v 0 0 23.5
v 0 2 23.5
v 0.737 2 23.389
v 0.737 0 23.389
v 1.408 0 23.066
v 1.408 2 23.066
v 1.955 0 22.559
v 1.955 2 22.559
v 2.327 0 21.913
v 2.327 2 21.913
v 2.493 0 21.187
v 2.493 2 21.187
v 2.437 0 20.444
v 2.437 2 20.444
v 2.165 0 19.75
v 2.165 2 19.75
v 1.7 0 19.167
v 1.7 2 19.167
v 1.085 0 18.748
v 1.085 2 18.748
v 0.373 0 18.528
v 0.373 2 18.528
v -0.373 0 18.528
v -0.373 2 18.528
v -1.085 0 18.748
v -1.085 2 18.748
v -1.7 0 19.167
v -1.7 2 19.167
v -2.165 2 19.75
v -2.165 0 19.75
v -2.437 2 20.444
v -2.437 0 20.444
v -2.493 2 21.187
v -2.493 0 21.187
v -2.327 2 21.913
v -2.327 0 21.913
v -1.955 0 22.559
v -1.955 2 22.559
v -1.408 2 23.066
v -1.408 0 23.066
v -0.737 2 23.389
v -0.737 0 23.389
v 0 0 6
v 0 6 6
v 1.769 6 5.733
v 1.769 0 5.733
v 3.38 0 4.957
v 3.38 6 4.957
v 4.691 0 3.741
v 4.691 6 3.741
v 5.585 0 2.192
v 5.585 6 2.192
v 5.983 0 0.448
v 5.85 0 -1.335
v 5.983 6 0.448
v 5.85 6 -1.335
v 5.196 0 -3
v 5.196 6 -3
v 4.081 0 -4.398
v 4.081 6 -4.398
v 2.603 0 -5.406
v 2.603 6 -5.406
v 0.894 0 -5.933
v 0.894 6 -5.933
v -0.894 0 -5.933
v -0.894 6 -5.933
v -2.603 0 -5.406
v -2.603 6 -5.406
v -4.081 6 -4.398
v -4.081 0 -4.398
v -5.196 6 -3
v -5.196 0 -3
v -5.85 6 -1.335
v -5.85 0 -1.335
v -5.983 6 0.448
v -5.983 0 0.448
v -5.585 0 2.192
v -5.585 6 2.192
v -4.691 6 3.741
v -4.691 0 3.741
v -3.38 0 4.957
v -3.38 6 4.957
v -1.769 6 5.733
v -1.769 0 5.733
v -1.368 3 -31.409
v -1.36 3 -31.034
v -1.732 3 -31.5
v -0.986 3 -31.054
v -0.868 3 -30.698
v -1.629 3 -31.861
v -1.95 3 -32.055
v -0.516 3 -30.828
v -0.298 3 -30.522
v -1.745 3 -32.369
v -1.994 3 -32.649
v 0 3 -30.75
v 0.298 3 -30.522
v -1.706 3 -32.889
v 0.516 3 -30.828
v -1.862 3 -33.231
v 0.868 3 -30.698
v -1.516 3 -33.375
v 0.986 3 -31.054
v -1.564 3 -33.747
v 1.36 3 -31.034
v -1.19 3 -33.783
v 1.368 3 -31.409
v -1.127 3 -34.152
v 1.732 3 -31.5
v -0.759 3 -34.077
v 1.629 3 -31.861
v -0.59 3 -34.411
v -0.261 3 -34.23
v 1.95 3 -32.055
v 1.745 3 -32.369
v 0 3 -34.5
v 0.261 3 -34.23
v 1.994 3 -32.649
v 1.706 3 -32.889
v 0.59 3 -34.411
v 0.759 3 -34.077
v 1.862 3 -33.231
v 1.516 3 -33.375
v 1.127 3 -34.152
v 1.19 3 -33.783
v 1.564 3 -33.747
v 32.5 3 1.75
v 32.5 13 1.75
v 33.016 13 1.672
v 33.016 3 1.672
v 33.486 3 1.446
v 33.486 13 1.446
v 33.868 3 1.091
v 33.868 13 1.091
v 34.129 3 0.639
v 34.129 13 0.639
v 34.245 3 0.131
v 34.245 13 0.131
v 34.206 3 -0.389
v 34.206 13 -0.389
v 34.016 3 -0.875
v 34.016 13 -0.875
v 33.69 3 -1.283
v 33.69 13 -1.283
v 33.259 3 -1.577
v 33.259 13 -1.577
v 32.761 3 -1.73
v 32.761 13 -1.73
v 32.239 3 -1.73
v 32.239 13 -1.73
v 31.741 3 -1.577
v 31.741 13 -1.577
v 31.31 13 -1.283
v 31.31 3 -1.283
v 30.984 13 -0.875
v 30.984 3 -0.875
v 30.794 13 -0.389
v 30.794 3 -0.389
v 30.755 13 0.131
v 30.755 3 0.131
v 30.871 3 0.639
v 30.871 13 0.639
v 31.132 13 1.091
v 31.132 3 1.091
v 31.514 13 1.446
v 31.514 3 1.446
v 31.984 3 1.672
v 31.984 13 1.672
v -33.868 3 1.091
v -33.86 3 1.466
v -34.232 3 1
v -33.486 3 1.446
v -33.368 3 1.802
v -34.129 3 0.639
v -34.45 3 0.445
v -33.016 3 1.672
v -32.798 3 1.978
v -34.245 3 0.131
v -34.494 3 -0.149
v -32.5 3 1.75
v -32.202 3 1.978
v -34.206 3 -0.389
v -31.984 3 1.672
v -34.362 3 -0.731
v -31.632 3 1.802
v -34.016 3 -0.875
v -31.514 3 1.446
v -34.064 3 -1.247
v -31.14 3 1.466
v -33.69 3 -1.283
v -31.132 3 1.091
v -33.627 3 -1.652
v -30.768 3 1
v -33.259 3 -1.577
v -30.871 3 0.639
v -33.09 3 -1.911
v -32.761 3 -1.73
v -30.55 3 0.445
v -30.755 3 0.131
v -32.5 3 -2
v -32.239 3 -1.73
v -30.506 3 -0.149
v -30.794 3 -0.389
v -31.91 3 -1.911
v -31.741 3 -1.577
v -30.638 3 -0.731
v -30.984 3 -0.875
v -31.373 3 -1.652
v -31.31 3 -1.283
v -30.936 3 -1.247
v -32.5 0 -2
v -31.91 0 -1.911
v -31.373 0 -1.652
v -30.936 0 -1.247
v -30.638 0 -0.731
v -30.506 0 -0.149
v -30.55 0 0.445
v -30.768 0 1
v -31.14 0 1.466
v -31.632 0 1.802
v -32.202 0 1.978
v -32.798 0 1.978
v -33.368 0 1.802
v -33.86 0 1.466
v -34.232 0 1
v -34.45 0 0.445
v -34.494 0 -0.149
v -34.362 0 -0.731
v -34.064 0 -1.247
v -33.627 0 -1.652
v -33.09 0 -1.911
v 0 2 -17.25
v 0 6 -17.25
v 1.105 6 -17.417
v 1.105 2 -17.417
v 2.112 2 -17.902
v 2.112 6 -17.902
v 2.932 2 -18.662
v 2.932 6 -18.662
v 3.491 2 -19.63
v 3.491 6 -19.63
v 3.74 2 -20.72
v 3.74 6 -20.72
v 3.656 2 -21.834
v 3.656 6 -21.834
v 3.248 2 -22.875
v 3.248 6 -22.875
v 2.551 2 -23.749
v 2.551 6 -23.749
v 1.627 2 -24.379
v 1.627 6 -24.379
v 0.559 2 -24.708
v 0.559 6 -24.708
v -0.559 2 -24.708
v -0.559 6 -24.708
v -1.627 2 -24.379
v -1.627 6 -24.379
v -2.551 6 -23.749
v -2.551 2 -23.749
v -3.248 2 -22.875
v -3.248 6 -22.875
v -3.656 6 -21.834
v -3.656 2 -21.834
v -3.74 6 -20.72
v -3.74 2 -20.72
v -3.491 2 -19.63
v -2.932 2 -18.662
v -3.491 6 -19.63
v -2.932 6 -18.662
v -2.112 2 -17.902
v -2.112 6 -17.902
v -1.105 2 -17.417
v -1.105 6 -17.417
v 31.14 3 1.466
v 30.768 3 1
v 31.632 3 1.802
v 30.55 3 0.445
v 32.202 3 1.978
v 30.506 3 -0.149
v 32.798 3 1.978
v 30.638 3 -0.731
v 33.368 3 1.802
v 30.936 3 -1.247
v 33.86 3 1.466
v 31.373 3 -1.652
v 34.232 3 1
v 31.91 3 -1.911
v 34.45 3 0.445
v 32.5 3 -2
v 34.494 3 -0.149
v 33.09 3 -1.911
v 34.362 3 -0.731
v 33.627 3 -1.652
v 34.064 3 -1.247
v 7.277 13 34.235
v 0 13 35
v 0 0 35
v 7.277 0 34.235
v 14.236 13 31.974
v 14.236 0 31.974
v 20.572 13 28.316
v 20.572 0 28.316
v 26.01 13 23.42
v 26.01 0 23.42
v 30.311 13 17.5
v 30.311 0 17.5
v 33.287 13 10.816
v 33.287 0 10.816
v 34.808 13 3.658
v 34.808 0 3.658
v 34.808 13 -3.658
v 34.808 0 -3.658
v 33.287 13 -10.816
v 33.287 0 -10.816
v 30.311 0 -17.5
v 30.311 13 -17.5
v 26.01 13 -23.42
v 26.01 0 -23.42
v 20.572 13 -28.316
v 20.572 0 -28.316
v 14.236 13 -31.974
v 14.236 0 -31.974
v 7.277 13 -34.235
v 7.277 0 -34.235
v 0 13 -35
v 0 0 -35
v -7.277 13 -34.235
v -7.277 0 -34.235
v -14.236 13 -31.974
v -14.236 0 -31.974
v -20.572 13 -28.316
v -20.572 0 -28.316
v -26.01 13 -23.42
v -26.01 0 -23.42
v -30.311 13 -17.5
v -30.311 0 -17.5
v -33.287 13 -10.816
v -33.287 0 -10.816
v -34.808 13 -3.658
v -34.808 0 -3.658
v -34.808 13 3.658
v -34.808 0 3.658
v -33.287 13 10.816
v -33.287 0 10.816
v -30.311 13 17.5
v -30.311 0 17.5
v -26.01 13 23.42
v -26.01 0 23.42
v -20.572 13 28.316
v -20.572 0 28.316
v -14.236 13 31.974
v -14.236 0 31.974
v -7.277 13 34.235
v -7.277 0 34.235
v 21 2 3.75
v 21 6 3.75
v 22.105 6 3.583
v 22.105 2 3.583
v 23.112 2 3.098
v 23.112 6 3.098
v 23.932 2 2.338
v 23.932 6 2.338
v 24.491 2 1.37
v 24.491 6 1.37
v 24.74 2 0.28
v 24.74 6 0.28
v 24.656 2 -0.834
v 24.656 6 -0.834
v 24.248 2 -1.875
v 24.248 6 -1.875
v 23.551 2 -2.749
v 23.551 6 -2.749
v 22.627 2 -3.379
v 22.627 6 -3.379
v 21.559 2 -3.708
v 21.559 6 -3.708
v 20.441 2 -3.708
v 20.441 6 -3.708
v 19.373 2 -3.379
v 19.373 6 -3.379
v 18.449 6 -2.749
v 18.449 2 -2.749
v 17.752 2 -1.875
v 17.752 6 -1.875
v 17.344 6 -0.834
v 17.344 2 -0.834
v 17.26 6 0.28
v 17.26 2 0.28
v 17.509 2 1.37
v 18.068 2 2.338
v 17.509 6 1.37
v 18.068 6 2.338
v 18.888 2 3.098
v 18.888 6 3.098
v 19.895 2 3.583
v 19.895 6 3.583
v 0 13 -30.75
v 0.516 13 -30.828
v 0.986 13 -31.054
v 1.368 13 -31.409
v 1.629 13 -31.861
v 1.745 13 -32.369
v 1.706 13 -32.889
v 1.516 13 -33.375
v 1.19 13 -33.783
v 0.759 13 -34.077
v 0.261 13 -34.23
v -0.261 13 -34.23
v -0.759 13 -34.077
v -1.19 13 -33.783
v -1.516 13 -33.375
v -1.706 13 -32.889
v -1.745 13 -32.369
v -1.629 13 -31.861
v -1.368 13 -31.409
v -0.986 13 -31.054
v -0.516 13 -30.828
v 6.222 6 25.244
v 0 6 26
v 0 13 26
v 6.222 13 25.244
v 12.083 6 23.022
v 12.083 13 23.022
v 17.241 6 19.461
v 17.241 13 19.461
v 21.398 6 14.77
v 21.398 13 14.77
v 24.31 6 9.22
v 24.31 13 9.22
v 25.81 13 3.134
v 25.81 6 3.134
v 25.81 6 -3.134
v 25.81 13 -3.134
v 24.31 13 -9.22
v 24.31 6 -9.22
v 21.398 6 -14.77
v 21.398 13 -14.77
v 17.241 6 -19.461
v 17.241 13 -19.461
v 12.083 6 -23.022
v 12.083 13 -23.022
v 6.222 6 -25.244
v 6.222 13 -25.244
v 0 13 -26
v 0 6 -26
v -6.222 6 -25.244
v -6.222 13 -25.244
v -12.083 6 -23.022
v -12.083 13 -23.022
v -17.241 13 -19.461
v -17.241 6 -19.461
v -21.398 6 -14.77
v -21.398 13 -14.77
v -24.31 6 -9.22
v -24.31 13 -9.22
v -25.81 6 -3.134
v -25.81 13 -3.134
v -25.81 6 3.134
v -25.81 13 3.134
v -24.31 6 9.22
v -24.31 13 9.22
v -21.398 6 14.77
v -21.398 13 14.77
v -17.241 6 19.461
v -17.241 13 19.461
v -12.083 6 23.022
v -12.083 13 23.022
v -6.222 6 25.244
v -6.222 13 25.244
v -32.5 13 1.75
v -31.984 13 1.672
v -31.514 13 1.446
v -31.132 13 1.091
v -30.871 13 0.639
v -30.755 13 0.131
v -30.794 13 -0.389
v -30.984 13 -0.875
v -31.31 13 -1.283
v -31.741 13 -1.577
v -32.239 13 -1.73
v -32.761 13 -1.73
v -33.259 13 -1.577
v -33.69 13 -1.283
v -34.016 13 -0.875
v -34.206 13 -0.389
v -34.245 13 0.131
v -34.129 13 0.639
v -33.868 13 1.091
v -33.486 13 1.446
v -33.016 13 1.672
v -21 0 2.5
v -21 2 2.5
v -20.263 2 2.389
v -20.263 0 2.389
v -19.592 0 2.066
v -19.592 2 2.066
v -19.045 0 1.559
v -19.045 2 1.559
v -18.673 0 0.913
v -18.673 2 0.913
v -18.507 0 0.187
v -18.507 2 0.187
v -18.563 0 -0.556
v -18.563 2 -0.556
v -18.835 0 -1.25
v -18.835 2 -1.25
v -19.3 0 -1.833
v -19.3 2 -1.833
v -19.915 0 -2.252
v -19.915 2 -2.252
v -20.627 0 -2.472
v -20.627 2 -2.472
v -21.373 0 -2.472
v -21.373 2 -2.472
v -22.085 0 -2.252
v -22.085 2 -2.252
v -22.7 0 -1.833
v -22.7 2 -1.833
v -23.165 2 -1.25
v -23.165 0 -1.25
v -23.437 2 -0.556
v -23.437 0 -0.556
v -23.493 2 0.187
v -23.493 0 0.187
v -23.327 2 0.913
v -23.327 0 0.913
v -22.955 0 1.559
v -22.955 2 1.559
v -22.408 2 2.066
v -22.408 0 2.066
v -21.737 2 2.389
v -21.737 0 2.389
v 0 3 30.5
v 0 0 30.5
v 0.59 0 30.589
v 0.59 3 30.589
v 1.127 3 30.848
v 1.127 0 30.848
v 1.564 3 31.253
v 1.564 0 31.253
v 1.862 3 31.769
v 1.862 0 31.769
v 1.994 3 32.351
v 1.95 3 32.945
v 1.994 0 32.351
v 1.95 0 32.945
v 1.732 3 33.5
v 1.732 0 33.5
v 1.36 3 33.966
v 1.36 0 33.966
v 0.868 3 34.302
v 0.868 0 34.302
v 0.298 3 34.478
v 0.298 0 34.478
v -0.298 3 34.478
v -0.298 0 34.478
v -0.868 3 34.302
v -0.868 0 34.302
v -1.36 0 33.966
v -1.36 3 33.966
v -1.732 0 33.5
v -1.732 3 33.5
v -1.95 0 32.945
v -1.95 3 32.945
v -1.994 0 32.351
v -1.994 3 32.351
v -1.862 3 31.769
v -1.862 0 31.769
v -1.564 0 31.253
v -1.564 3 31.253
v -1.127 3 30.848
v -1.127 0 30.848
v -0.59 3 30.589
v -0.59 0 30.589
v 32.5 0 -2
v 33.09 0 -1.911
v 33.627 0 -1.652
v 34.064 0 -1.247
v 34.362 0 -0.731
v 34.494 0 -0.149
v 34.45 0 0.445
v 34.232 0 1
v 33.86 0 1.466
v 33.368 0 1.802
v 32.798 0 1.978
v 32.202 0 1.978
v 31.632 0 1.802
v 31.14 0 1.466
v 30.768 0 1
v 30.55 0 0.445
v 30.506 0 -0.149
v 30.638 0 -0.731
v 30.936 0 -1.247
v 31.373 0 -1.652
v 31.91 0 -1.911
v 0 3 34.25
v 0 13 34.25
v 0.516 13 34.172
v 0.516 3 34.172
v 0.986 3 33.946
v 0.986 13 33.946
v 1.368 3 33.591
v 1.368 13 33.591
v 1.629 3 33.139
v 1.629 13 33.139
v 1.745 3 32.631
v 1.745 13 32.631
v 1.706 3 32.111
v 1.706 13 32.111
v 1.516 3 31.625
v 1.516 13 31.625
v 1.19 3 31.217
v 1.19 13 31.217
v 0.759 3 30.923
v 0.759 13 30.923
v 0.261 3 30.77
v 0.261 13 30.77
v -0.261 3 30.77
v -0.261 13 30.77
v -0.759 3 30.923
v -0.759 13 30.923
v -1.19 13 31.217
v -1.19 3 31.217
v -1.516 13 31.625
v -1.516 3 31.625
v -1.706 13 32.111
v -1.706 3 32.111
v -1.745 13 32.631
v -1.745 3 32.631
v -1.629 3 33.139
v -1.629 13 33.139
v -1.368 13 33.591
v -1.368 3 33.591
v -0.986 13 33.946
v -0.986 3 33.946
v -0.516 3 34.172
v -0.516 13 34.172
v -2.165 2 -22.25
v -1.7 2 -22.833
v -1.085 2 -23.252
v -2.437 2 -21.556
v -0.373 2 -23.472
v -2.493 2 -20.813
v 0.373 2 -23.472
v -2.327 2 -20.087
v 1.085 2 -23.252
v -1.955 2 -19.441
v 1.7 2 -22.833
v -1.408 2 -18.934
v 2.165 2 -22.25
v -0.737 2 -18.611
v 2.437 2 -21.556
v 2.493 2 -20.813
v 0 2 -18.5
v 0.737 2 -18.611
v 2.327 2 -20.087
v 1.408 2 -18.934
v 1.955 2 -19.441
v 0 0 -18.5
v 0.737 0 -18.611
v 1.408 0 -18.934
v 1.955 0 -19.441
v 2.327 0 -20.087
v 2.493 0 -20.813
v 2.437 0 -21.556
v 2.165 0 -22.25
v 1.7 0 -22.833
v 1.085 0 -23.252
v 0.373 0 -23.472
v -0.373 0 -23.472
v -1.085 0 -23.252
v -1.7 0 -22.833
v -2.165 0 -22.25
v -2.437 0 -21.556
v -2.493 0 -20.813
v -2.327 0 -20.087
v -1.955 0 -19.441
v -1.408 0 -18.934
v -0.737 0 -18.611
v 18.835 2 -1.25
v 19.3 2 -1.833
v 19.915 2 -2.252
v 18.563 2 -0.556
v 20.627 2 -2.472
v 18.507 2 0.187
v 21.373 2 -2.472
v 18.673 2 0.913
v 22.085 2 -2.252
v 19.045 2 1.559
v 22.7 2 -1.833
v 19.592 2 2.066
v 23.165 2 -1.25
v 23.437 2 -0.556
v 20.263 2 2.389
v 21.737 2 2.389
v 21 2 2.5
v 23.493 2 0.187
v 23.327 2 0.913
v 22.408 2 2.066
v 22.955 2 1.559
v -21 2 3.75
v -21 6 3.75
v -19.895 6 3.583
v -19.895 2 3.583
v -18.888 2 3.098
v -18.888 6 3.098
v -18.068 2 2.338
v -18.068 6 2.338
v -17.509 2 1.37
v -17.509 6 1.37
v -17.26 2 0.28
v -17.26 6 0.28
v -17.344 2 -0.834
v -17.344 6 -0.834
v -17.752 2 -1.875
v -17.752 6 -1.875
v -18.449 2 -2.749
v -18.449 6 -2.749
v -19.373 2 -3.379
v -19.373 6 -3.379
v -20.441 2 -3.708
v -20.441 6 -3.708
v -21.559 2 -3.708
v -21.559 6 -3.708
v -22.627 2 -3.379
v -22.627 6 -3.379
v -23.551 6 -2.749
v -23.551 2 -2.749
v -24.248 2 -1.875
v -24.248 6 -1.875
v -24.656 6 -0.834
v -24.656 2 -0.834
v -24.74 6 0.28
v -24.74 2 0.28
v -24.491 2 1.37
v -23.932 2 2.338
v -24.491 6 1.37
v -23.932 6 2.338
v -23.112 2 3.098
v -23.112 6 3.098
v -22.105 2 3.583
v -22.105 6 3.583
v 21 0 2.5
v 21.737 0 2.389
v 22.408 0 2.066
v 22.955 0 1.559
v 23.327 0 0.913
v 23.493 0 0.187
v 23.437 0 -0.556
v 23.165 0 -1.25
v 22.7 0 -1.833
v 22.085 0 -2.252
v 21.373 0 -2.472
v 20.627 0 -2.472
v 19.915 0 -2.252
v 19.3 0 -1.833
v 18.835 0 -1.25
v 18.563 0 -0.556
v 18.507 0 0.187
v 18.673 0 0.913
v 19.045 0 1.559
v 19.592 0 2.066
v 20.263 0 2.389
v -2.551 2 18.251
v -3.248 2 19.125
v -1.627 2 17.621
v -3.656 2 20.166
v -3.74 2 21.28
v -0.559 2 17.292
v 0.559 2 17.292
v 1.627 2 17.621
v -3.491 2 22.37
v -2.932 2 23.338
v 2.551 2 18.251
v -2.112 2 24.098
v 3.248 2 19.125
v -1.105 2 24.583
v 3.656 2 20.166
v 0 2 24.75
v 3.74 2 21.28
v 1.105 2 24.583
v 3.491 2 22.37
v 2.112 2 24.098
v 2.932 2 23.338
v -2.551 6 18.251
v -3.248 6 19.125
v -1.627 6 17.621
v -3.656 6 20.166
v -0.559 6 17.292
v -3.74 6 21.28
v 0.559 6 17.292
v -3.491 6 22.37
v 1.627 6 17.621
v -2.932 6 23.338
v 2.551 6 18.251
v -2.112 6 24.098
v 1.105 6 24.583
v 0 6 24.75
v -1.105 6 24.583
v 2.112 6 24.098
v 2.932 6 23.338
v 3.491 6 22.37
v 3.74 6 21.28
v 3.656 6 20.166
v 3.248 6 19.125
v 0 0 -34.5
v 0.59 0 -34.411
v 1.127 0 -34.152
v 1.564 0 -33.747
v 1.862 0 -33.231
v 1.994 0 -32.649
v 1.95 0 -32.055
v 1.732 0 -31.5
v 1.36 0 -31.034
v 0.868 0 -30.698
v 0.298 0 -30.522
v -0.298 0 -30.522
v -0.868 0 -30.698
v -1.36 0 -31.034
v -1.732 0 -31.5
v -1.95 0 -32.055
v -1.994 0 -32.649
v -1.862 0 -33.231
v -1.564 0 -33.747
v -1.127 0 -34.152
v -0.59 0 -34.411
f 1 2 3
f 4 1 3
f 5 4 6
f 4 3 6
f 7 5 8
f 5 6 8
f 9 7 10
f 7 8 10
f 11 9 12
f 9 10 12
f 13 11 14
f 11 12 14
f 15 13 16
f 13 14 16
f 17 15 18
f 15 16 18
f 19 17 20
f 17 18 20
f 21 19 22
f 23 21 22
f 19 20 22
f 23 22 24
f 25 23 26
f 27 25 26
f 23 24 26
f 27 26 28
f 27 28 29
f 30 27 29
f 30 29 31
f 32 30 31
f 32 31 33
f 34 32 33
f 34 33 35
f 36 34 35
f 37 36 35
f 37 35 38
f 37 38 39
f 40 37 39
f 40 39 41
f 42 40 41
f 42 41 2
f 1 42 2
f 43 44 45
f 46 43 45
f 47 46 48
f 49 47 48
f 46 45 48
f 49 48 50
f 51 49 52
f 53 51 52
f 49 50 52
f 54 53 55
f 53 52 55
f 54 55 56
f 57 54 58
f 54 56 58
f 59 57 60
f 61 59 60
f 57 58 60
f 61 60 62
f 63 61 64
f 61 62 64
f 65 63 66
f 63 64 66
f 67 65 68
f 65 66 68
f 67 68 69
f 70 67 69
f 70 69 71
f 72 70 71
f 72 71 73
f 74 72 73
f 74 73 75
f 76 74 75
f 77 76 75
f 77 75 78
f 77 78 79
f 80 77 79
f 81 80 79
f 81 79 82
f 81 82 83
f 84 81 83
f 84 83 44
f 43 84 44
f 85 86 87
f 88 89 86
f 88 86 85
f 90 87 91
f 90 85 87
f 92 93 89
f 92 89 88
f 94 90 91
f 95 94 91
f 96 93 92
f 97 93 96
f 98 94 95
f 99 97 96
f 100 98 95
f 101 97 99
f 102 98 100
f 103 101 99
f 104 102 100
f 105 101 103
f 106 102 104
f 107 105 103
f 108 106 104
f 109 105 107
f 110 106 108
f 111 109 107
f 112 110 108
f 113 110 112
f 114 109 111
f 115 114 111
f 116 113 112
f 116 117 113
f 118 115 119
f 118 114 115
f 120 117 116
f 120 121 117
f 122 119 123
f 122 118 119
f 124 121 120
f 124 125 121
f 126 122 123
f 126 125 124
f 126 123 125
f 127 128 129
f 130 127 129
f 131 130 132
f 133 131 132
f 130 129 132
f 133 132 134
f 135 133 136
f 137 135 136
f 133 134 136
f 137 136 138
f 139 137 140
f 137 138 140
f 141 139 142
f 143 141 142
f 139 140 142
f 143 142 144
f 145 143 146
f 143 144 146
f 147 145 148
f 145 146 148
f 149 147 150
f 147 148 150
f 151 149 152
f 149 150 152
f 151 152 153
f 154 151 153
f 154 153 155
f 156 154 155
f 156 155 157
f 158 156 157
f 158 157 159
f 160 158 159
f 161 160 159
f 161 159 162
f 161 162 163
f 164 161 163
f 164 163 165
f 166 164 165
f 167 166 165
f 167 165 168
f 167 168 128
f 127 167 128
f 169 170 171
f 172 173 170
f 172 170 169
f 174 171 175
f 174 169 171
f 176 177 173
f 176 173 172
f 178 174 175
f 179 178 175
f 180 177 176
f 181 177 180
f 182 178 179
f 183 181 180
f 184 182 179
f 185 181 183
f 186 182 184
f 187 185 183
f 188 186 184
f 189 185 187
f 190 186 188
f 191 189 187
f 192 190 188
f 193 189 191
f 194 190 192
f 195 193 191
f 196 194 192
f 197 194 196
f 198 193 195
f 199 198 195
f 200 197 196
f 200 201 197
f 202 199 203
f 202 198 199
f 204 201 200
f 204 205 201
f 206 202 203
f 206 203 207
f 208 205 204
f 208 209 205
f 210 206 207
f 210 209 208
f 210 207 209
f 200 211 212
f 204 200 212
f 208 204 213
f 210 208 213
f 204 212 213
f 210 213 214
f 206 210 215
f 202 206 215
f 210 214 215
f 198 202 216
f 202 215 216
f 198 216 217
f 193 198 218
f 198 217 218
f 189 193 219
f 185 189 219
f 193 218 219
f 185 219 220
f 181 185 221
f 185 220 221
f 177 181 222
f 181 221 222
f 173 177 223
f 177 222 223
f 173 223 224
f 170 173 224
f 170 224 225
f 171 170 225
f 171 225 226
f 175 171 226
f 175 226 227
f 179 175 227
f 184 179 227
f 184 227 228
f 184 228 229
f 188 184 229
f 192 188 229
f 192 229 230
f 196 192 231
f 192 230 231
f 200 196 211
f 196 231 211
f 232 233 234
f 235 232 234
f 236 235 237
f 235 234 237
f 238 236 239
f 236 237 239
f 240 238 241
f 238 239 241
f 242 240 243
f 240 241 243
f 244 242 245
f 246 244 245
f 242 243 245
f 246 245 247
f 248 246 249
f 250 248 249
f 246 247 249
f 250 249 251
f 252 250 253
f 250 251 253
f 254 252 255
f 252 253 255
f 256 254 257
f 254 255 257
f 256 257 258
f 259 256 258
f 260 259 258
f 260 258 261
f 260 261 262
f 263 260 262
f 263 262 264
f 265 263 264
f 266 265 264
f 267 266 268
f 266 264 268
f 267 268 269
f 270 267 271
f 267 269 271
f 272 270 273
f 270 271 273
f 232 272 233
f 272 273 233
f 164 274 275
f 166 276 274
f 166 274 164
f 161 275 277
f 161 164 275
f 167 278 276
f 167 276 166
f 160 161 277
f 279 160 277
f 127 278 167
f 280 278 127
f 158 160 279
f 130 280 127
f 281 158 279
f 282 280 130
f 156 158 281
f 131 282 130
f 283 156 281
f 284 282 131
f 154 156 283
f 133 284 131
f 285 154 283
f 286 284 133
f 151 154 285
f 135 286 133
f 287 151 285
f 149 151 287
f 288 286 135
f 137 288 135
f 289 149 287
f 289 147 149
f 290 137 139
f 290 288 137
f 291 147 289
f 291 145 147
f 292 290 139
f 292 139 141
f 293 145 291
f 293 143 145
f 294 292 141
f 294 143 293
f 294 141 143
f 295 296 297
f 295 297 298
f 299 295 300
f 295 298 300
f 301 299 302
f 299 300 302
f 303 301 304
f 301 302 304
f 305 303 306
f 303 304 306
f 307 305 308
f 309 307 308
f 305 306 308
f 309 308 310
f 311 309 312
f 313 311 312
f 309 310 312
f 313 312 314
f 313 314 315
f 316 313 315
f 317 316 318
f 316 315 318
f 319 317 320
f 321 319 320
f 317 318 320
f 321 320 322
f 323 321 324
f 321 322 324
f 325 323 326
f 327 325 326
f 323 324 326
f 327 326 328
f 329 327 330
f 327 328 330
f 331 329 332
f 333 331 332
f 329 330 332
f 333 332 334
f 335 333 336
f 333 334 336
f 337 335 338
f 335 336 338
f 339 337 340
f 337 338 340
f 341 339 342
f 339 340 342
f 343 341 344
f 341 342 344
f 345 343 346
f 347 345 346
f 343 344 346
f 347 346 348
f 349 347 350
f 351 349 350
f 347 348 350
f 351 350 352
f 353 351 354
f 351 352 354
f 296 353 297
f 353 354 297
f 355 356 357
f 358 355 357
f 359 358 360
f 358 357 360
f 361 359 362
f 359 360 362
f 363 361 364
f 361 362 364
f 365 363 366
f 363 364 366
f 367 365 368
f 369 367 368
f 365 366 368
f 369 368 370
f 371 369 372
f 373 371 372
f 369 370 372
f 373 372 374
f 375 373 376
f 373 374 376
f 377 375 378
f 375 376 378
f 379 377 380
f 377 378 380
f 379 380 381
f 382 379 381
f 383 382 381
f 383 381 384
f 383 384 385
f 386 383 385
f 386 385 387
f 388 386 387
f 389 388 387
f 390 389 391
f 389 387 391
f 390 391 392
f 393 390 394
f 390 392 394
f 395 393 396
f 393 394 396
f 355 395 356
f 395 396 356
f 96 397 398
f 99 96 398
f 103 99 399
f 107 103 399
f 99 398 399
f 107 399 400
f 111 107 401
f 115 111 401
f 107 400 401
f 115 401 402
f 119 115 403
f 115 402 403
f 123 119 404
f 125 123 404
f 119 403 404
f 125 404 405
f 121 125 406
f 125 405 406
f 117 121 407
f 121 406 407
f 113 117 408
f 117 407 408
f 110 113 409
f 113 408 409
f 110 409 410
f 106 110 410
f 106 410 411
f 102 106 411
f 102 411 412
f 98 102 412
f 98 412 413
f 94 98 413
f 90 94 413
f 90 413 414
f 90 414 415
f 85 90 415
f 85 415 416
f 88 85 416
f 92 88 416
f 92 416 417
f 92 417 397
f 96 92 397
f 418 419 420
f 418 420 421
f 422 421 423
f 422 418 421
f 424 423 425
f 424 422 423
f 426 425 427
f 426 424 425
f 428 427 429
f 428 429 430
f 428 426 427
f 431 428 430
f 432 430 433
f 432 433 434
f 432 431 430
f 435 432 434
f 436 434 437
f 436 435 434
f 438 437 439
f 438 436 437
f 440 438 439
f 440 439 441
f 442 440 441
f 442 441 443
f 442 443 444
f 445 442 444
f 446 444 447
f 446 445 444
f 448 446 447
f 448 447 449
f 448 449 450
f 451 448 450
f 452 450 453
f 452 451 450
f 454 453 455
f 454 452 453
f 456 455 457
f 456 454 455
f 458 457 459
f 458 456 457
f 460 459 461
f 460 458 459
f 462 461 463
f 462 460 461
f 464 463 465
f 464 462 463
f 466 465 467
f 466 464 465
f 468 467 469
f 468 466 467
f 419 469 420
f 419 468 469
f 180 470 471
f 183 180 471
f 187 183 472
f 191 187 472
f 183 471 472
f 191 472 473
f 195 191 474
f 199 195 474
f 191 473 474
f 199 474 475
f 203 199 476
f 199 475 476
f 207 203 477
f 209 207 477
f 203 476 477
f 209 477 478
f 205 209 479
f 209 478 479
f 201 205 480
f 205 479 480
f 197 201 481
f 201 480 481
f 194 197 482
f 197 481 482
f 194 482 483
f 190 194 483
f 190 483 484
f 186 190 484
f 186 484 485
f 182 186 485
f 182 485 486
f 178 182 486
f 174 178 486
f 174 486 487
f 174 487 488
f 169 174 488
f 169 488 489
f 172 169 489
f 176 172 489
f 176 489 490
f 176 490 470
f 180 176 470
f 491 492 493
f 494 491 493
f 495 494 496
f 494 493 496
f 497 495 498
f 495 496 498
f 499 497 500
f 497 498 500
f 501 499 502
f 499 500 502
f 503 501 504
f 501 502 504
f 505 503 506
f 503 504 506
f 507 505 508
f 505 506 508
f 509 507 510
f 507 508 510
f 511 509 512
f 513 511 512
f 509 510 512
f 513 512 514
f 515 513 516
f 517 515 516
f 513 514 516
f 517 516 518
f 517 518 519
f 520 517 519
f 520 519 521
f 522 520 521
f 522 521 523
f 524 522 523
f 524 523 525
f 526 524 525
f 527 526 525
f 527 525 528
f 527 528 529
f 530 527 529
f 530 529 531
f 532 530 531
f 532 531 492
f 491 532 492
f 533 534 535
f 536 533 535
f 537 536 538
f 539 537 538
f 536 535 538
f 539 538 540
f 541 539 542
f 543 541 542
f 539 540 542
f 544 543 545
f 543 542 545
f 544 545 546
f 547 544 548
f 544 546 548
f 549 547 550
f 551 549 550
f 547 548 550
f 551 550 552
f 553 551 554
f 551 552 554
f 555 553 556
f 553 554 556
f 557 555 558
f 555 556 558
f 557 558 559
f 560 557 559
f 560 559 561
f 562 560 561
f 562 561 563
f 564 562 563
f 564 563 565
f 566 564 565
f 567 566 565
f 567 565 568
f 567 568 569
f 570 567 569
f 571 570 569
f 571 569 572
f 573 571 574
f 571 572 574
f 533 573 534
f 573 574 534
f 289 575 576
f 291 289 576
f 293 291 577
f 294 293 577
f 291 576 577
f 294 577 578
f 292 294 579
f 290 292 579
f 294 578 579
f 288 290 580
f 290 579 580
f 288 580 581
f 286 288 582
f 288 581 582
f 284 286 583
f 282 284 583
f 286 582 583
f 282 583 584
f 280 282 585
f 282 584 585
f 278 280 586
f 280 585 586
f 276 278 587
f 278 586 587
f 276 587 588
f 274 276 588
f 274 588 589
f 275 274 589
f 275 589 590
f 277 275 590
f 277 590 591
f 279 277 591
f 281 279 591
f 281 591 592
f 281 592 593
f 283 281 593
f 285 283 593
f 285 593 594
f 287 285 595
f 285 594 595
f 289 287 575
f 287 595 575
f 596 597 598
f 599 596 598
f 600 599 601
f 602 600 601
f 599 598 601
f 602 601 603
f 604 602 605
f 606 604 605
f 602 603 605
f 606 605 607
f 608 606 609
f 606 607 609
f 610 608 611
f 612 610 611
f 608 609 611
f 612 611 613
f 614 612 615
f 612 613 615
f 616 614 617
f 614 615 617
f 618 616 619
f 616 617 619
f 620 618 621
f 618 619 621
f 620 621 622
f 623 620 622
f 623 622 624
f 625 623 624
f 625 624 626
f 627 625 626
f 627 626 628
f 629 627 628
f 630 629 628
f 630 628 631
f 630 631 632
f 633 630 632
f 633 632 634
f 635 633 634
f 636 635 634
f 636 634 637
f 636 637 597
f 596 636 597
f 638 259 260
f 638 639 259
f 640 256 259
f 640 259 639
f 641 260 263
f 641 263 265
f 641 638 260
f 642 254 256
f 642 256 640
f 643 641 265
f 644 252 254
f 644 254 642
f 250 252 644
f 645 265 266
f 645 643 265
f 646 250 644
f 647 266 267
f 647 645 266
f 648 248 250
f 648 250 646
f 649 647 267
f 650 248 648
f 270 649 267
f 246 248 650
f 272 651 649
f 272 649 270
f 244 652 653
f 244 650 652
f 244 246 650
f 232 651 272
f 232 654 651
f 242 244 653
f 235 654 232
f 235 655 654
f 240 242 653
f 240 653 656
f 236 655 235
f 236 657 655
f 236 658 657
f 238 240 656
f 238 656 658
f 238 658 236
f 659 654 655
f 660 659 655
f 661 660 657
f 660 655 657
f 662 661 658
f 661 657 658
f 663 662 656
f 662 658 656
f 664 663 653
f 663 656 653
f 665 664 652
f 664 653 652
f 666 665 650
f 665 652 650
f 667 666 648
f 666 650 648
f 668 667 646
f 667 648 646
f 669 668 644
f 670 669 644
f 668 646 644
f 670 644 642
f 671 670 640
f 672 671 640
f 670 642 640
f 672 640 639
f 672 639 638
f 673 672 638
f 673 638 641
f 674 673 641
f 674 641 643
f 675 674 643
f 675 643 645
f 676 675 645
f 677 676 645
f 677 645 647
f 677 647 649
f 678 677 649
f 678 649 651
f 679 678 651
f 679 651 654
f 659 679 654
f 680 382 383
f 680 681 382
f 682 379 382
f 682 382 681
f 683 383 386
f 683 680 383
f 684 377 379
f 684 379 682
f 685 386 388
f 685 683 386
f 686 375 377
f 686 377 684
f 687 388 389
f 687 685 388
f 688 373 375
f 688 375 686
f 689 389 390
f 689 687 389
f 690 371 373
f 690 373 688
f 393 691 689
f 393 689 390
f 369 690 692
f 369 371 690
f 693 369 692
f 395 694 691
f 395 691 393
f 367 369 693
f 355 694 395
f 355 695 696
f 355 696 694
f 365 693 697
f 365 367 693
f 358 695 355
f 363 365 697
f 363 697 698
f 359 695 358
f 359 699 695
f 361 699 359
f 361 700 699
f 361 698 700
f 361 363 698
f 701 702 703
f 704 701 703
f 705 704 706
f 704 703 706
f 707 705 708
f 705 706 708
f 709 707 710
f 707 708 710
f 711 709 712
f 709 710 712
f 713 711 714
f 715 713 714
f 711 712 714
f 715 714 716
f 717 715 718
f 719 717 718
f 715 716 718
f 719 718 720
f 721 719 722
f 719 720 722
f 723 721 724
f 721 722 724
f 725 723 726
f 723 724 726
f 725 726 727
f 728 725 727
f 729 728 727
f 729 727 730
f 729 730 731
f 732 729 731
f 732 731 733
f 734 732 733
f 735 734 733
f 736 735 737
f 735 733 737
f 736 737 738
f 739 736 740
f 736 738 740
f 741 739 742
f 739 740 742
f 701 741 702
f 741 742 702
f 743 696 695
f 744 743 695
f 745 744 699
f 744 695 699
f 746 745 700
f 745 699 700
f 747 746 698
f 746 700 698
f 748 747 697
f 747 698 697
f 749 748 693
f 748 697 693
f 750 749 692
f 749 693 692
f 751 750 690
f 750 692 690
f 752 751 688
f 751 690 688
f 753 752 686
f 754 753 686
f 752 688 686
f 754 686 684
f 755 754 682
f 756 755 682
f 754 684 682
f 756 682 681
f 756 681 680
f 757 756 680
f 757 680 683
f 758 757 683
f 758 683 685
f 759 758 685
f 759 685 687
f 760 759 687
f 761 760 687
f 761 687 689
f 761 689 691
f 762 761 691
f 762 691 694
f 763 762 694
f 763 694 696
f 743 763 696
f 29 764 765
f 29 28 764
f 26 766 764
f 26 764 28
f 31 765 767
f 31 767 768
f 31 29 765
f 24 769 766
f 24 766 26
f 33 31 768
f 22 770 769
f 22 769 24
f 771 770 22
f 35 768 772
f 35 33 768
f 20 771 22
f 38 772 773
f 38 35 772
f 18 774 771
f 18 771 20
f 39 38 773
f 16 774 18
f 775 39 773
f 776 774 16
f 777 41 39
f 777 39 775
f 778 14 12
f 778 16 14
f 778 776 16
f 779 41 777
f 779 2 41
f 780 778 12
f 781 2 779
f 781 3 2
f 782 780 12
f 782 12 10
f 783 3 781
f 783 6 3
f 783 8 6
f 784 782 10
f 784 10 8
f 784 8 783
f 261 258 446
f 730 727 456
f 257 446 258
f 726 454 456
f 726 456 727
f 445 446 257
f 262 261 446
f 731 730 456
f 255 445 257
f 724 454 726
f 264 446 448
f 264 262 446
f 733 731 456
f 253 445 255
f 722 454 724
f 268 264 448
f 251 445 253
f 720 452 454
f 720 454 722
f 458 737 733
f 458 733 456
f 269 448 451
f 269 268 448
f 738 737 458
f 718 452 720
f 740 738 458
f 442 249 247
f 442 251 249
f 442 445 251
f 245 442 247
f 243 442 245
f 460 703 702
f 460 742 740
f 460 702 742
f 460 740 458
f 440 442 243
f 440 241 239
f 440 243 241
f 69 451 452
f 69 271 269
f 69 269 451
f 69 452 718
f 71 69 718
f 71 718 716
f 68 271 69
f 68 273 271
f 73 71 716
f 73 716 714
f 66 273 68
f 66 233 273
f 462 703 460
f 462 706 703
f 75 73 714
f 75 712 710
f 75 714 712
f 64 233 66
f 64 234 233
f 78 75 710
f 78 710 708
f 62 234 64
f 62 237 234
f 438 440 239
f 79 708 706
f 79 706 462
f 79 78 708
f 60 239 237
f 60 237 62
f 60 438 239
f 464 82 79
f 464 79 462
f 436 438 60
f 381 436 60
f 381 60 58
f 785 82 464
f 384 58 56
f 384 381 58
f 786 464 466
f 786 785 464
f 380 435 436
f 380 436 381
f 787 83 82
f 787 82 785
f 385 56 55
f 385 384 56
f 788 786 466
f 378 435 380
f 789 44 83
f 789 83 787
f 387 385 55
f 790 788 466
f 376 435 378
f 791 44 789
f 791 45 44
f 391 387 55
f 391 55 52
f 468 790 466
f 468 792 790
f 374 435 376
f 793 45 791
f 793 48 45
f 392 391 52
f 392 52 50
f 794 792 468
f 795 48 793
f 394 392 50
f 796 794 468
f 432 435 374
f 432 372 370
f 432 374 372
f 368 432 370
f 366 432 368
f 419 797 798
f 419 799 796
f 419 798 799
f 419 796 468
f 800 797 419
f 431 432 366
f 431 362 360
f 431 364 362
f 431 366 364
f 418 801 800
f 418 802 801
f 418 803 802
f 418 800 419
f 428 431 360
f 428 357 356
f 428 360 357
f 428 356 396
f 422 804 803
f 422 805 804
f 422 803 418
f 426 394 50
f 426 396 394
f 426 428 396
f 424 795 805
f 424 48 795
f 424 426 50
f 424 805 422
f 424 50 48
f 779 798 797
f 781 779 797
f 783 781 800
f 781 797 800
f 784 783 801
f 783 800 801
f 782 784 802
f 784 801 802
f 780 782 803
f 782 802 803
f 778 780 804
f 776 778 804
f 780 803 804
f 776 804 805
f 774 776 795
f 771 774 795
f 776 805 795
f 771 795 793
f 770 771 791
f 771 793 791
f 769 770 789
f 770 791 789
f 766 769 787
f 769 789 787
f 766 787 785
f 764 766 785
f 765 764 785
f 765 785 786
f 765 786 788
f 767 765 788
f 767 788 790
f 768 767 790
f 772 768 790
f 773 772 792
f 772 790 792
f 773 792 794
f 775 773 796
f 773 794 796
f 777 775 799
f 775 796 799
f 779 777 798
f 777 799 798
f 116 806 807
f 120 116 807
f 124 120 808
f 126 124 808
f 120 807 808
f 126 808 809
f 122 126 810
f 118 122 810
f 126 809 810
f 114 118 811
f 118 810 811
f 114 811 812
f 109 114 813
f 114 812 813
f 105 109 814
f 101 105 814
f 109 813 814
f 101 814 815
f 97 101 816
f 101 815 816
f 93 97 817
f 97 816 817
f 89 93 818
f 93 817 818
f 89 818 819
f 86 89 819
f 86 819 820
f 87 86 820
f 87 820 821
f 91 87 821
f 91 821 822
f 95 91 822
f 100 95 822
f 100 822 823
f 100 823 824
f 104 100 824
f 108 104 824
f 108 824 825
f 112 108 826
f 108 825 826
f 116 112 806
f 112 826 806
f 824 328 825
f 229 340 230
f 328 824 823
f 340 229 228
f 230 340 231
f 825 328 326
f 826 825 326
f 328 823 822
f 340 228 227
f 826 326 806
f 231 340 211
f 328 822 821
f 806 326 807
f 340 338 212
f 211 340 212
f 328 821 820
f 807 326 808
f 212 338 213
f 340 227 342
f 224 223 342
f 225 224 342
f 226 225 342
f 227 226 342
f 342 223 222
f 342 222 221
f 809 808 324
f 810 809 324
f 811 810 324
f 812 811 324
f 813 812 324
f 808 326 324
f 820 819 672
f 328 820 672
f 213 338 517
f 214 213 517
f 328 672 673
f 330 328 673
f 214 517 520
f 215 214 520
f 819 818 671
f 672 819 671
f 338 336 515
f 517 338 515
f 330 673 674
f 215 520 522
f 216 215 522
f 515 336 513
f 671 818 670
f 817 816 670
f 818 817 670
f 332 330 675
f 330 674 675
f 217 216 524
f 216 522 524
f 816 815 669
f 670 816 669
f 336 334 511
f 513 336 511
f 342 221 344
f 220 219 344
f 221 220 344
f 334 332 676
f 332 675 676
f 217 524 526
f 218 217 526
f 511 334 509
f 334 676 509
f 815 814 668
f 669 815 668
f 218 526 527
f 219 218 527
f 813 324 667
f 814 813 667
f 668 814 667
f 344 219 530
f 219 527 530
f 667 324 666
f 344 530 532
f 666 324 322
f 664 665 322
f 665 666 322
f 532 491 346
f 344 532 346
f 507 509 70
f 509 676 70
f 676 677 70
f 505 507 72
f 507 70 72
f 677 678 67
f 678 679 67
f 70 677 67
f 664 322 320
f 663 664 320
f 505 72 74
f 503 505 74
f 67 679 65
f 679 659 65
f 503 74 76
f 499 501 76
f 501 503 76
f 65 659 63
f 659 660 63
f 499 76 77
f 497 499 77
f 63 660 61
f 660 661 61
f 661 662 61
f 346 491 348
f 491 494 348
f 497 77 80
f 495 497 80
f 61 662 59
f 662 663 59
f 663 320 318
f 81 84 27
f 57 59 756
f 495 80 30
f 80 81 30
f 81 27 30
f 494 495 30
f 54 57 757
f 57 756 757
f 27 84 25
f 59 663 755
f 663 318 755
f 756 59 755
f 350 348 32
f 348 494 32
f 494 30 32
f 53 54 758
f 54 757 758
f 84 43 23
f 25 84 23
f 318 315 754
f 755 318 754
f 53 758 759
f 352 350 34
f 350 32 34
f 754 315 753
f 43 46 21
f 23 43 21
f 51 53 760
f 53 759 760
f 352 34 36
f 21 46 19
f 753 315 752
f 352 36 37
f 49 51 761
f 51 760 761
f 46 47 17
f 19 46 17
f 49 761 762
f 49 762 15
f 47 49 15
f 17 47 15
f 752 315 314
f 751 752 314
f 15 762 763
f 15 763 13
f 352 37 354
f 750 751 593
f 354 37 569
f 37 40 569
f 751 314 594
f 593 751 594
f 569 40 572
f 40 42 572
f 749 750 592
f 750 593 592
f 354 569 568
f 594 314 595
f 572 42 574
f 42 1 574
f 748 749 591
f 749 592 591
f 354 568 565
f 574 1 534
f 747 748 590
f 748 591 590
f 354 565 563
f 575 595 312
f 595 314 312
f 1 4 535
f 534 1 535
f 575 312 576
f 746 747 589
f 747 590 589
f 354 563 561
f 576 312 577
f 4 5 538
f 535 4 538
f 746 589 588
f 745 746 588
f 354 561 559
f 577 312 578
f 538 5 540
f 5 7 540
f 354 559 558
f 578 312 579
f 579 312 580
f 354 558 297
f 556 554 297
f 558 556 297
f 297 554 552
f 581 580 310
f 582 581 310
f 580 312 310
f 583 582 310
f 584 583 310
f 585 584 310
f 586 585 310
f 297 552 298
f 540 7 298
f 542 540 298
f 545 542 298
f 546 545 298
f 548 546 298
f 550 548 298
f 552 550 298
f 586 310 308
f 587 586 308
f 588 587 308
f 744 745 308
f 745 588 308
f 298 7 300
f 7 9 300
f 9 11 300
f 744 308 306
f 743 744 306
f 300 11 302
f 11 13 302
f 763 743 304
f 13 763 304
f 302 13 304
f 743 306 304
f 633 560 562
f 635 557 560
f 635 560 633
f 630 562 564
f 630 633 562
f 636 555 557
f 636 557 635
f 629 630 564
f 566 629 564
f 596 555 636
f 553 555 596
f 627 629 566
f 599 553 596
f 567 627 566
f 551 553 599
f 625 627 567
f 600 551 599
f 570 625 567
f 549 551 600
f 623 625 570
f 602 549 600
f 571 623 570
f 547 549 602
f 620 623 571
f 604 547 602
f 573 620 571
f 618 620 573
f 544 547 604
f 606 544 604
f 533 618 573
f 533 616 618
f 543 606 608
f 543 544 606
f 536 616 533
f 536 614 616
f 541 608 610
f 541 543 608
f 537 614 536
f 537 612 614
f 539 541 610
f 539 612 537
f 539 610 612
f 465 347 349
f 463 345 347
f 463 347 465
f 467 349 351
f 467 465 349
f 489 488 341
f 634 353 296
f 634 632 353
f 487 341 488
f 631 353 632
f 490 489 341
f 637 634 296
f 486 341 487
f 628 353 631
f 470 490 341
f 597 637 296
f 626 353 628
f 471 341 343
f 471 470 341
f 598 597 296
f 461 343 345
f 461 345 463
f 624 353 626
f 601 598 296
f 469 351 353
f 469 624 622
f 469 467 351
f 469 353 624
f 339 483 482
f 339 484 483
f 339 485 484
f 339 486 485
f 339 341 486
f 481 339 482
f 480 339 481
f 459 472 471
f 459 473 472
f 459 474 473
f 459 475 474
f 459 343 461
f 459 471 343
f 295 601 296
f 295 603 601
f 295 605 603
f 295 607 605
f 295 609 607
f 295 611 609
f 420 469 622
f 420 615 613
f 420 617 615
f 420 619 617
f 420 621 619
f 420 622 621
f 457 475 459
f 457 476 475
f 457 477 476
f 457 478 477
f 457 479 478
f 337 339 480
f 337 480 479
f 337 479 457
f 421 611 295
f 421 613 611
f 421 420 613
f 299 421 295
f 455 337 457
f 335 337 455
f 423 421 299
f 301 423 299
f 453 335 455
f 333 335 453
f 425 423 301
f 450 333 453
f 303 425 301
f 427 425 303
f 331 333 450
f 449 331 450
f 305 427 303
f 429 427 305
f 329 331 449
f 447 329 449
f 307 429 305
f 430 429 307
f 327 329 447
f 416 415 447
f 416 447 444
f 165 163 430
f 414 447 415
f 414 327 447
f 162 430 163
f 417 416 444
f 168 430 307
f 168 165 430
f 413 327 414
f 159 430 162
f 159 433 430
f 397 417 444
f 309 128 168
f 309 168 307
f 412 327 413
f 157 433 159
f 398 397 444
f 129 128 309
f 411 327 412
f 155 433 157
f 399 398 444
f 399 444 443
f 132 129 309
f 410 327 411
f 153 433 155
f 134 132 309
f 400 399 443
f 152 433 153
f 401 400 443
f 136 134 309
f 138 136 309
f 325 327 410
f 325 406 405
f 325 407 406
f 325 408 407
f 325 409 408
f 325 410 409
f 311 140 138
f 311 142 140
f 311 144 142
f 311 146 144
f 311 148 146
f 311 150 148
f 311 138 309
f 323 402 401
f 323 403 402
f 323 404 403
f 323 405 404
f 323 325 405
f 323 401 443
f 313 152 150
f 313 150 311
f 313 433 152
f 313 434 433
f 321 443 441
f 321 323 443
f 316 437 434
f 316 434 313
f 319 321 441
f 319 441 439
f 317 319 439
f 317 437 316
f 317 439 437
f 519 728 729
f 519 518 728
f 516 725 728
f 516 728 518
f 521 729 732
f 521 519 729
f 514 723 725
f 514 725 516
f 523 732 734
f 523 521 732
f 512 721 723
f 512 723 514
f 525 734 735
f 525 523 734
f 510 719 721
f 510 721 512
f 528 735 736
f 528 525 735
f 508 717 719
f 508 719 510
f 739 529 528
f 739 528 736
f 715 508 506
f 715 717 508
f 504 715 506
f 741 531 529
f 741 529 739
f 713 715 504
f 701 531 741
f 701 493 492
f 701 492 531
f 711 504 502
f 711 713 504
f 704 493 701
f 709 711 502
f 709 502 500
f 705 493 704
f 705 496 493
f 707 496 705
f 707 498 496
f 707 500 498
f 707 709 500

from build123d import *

# Parameters (mm, degrees)
SKETCH1_R           = 35
BOSS_EXTRUDE1_DEPTH = 6
SKETCH2_R           = 3.75
CUT_EXTRUDE1_DEPTH  = 4
SKETCH3_R           = 6
SKETCH3_R_2         = 2.5
CUT_EXTRUDE2_DEPTH  = 50.859803449
SKETCH4_R           = 35
SKETCH4_R_2         = 30
BOSS_EXTRUDE2_DEPTH = 7
SKETCH5_R           = 30
SKETCH5_R_2         = 26
BOSS_EXTRUDE3_DEPTH = 7
SKETCH6_R           = 1.75
CUT_EXTRUDE3_DEPTH  = 52.176166328
SKETCH7_R           = 2
CUT_EXTRUDE4_DEPTH  = 3


with BuildPart() as part:
    # Sketch1 → Boss-Extrude1 (new body)
    with BuildSketch(Plane(origin=(0, 0, 0), x_dir=(1, 0, 0), z_dir=(0, 1, 0))):
        with Locations(Location((0, 0, 0), (0, 0, 270))):
            Circle(SKETCH1_R)
    extrude(amount=BOSS_EXTRUDE1_DEPTH)

    # Sketch2 → Cut-Extrude1 (cut)
    with BuildSketch(Plane(origin=(0, 6, 0), x_dir=(1, 0, 0), z_dir=(0, 1, 0))):
        with Locations(Location((0, 21, 0), (0, 0, 270))):
            Circle(SKETCH2_R)
        with Locations(Location((21, 0, 0), (0, 0, 270))):
            Circle(SKETCH2_R)
        with Locations(Location((0, -21, 0), (0, 0, 270))):
            Circle(SKETCH2_R)
        with Locations(Location((-21, 0, 0), (0, 0, 270))):
            Circle(SKETCH2_R)
    extrude(amount=-CUT_EXTRUDE1_DEPTH, mode=Mode.SUBTRACT)

    # Sketch3 → Cut-Extrude2 (cut, through all)
    with BuildSketch(Plane(origin=(0, 6, 0), x_dir=(1, 0, 0), z_dir=(0, 1, 0))):
        with Locations(Location((0, 0, 0), (0, 0, 270))):
            Circle(SKETCH3_R)
        with Locations(Location((0, 21, 0), (0, 0, 270))):
            Circle(SKETCH3_R_2)
        with Locations(Location((21, 0, 0), (0, 0, 270))):
            Circle(SKETCH3_R_2)
        with Locations(Location((0, -21, 0), (0, 0, 270))):
            Circle(SKETCH3_R_2)
        with Locations(Location((-21, 0, 0), (0, 0, 270))):
            Circle(SKETCH3_R_2)
    extrude(amount=-CUT_EXTRUDE2_DEPTH, mode=Mode.SUBTRACT)

    # Sketch4 → Boss-Extrude2 (add)
    with BuildSketch(Plane(origin=(0, 6, 0), x_dir=(1, 0, 0), z_dir=(0, 1, 0))):
        with Locations(Location((0, 0, 0), (0, 0, 270))):
            Circle(SKETCH4_R)
        with Locations(Location((0, 0, 0), (0, 0, 270))):
            Circle(SKETCH4_R_2, mode=Mode.SUBTRACT)
    extrude(amount=BOSS_EXTRUDE2_DEPTH)

    # Sketch5 → Boss-Extrude3 (add)
    with BuildSketch(Plane(origin=(0, 6, 0), x_dir=(1, 0, 0), z_dir=(0, 1, 0))):
        Circle(SKETCH5_R)
        with Locations(Location((0, 0, 0), (0, 0, 270))):
            Circle(SKETCH5_R_2, mode=Mode.SUBTRACT)
    extrude(amount=BOSS_EXTRUDE3_DEPTH)

    # Sketch6 → Cut-Extrude3 (cut, through all)
    with BuildSketch(Plane(origin=(0, 13, 0), x_dir=(1, 0, 0), z_dir=(0, 1, 0))):
        with Locations(Location((0, 32.5, 0), (0, 0, 270))):
            Circle(SKETCH6_R)
        with Locations(Location((32.5, 0, 0), (0, 0, 270))):
            Circle(SKETCH6_R)
        with Locations(Location((0, -32.5, 0), (0, 0, 270))):
            Circle(SKETCH6_R)
        with Locations(Location((-32.5, 0, 0), (0, 0, 270))):
            Circle(SKETCH6_R)
    extrude(amount=-CUT_EXTRUDE3_DEPTH, mode=Mode.SUBTRACT)

    # Sketch7 → Cut-Extrude4 (cut)
    with BuildSketch(Plane.XZ):
        with Locations(Location((0, 32.5, 0), (0, 0, 270))):
            Circle(SKETCH7_R)
        with Locations(Location((32.5, 0, 0), (0, 0, 270))):
            Circle(SKETCH7_R)
        with Locations(Location((0, -32.5, 0), (0, 0, 270))):
            Circle(SKETCH7_R)
        with Locations(Location((-32.5, 0, 0), (0, 0, 270))):
            Circle(SKETCH7_R)
    extrude(amount=-CUT_EXTRUDE4_DEPTH, mode=Mode.SUBTRACT)


solid = part.part
